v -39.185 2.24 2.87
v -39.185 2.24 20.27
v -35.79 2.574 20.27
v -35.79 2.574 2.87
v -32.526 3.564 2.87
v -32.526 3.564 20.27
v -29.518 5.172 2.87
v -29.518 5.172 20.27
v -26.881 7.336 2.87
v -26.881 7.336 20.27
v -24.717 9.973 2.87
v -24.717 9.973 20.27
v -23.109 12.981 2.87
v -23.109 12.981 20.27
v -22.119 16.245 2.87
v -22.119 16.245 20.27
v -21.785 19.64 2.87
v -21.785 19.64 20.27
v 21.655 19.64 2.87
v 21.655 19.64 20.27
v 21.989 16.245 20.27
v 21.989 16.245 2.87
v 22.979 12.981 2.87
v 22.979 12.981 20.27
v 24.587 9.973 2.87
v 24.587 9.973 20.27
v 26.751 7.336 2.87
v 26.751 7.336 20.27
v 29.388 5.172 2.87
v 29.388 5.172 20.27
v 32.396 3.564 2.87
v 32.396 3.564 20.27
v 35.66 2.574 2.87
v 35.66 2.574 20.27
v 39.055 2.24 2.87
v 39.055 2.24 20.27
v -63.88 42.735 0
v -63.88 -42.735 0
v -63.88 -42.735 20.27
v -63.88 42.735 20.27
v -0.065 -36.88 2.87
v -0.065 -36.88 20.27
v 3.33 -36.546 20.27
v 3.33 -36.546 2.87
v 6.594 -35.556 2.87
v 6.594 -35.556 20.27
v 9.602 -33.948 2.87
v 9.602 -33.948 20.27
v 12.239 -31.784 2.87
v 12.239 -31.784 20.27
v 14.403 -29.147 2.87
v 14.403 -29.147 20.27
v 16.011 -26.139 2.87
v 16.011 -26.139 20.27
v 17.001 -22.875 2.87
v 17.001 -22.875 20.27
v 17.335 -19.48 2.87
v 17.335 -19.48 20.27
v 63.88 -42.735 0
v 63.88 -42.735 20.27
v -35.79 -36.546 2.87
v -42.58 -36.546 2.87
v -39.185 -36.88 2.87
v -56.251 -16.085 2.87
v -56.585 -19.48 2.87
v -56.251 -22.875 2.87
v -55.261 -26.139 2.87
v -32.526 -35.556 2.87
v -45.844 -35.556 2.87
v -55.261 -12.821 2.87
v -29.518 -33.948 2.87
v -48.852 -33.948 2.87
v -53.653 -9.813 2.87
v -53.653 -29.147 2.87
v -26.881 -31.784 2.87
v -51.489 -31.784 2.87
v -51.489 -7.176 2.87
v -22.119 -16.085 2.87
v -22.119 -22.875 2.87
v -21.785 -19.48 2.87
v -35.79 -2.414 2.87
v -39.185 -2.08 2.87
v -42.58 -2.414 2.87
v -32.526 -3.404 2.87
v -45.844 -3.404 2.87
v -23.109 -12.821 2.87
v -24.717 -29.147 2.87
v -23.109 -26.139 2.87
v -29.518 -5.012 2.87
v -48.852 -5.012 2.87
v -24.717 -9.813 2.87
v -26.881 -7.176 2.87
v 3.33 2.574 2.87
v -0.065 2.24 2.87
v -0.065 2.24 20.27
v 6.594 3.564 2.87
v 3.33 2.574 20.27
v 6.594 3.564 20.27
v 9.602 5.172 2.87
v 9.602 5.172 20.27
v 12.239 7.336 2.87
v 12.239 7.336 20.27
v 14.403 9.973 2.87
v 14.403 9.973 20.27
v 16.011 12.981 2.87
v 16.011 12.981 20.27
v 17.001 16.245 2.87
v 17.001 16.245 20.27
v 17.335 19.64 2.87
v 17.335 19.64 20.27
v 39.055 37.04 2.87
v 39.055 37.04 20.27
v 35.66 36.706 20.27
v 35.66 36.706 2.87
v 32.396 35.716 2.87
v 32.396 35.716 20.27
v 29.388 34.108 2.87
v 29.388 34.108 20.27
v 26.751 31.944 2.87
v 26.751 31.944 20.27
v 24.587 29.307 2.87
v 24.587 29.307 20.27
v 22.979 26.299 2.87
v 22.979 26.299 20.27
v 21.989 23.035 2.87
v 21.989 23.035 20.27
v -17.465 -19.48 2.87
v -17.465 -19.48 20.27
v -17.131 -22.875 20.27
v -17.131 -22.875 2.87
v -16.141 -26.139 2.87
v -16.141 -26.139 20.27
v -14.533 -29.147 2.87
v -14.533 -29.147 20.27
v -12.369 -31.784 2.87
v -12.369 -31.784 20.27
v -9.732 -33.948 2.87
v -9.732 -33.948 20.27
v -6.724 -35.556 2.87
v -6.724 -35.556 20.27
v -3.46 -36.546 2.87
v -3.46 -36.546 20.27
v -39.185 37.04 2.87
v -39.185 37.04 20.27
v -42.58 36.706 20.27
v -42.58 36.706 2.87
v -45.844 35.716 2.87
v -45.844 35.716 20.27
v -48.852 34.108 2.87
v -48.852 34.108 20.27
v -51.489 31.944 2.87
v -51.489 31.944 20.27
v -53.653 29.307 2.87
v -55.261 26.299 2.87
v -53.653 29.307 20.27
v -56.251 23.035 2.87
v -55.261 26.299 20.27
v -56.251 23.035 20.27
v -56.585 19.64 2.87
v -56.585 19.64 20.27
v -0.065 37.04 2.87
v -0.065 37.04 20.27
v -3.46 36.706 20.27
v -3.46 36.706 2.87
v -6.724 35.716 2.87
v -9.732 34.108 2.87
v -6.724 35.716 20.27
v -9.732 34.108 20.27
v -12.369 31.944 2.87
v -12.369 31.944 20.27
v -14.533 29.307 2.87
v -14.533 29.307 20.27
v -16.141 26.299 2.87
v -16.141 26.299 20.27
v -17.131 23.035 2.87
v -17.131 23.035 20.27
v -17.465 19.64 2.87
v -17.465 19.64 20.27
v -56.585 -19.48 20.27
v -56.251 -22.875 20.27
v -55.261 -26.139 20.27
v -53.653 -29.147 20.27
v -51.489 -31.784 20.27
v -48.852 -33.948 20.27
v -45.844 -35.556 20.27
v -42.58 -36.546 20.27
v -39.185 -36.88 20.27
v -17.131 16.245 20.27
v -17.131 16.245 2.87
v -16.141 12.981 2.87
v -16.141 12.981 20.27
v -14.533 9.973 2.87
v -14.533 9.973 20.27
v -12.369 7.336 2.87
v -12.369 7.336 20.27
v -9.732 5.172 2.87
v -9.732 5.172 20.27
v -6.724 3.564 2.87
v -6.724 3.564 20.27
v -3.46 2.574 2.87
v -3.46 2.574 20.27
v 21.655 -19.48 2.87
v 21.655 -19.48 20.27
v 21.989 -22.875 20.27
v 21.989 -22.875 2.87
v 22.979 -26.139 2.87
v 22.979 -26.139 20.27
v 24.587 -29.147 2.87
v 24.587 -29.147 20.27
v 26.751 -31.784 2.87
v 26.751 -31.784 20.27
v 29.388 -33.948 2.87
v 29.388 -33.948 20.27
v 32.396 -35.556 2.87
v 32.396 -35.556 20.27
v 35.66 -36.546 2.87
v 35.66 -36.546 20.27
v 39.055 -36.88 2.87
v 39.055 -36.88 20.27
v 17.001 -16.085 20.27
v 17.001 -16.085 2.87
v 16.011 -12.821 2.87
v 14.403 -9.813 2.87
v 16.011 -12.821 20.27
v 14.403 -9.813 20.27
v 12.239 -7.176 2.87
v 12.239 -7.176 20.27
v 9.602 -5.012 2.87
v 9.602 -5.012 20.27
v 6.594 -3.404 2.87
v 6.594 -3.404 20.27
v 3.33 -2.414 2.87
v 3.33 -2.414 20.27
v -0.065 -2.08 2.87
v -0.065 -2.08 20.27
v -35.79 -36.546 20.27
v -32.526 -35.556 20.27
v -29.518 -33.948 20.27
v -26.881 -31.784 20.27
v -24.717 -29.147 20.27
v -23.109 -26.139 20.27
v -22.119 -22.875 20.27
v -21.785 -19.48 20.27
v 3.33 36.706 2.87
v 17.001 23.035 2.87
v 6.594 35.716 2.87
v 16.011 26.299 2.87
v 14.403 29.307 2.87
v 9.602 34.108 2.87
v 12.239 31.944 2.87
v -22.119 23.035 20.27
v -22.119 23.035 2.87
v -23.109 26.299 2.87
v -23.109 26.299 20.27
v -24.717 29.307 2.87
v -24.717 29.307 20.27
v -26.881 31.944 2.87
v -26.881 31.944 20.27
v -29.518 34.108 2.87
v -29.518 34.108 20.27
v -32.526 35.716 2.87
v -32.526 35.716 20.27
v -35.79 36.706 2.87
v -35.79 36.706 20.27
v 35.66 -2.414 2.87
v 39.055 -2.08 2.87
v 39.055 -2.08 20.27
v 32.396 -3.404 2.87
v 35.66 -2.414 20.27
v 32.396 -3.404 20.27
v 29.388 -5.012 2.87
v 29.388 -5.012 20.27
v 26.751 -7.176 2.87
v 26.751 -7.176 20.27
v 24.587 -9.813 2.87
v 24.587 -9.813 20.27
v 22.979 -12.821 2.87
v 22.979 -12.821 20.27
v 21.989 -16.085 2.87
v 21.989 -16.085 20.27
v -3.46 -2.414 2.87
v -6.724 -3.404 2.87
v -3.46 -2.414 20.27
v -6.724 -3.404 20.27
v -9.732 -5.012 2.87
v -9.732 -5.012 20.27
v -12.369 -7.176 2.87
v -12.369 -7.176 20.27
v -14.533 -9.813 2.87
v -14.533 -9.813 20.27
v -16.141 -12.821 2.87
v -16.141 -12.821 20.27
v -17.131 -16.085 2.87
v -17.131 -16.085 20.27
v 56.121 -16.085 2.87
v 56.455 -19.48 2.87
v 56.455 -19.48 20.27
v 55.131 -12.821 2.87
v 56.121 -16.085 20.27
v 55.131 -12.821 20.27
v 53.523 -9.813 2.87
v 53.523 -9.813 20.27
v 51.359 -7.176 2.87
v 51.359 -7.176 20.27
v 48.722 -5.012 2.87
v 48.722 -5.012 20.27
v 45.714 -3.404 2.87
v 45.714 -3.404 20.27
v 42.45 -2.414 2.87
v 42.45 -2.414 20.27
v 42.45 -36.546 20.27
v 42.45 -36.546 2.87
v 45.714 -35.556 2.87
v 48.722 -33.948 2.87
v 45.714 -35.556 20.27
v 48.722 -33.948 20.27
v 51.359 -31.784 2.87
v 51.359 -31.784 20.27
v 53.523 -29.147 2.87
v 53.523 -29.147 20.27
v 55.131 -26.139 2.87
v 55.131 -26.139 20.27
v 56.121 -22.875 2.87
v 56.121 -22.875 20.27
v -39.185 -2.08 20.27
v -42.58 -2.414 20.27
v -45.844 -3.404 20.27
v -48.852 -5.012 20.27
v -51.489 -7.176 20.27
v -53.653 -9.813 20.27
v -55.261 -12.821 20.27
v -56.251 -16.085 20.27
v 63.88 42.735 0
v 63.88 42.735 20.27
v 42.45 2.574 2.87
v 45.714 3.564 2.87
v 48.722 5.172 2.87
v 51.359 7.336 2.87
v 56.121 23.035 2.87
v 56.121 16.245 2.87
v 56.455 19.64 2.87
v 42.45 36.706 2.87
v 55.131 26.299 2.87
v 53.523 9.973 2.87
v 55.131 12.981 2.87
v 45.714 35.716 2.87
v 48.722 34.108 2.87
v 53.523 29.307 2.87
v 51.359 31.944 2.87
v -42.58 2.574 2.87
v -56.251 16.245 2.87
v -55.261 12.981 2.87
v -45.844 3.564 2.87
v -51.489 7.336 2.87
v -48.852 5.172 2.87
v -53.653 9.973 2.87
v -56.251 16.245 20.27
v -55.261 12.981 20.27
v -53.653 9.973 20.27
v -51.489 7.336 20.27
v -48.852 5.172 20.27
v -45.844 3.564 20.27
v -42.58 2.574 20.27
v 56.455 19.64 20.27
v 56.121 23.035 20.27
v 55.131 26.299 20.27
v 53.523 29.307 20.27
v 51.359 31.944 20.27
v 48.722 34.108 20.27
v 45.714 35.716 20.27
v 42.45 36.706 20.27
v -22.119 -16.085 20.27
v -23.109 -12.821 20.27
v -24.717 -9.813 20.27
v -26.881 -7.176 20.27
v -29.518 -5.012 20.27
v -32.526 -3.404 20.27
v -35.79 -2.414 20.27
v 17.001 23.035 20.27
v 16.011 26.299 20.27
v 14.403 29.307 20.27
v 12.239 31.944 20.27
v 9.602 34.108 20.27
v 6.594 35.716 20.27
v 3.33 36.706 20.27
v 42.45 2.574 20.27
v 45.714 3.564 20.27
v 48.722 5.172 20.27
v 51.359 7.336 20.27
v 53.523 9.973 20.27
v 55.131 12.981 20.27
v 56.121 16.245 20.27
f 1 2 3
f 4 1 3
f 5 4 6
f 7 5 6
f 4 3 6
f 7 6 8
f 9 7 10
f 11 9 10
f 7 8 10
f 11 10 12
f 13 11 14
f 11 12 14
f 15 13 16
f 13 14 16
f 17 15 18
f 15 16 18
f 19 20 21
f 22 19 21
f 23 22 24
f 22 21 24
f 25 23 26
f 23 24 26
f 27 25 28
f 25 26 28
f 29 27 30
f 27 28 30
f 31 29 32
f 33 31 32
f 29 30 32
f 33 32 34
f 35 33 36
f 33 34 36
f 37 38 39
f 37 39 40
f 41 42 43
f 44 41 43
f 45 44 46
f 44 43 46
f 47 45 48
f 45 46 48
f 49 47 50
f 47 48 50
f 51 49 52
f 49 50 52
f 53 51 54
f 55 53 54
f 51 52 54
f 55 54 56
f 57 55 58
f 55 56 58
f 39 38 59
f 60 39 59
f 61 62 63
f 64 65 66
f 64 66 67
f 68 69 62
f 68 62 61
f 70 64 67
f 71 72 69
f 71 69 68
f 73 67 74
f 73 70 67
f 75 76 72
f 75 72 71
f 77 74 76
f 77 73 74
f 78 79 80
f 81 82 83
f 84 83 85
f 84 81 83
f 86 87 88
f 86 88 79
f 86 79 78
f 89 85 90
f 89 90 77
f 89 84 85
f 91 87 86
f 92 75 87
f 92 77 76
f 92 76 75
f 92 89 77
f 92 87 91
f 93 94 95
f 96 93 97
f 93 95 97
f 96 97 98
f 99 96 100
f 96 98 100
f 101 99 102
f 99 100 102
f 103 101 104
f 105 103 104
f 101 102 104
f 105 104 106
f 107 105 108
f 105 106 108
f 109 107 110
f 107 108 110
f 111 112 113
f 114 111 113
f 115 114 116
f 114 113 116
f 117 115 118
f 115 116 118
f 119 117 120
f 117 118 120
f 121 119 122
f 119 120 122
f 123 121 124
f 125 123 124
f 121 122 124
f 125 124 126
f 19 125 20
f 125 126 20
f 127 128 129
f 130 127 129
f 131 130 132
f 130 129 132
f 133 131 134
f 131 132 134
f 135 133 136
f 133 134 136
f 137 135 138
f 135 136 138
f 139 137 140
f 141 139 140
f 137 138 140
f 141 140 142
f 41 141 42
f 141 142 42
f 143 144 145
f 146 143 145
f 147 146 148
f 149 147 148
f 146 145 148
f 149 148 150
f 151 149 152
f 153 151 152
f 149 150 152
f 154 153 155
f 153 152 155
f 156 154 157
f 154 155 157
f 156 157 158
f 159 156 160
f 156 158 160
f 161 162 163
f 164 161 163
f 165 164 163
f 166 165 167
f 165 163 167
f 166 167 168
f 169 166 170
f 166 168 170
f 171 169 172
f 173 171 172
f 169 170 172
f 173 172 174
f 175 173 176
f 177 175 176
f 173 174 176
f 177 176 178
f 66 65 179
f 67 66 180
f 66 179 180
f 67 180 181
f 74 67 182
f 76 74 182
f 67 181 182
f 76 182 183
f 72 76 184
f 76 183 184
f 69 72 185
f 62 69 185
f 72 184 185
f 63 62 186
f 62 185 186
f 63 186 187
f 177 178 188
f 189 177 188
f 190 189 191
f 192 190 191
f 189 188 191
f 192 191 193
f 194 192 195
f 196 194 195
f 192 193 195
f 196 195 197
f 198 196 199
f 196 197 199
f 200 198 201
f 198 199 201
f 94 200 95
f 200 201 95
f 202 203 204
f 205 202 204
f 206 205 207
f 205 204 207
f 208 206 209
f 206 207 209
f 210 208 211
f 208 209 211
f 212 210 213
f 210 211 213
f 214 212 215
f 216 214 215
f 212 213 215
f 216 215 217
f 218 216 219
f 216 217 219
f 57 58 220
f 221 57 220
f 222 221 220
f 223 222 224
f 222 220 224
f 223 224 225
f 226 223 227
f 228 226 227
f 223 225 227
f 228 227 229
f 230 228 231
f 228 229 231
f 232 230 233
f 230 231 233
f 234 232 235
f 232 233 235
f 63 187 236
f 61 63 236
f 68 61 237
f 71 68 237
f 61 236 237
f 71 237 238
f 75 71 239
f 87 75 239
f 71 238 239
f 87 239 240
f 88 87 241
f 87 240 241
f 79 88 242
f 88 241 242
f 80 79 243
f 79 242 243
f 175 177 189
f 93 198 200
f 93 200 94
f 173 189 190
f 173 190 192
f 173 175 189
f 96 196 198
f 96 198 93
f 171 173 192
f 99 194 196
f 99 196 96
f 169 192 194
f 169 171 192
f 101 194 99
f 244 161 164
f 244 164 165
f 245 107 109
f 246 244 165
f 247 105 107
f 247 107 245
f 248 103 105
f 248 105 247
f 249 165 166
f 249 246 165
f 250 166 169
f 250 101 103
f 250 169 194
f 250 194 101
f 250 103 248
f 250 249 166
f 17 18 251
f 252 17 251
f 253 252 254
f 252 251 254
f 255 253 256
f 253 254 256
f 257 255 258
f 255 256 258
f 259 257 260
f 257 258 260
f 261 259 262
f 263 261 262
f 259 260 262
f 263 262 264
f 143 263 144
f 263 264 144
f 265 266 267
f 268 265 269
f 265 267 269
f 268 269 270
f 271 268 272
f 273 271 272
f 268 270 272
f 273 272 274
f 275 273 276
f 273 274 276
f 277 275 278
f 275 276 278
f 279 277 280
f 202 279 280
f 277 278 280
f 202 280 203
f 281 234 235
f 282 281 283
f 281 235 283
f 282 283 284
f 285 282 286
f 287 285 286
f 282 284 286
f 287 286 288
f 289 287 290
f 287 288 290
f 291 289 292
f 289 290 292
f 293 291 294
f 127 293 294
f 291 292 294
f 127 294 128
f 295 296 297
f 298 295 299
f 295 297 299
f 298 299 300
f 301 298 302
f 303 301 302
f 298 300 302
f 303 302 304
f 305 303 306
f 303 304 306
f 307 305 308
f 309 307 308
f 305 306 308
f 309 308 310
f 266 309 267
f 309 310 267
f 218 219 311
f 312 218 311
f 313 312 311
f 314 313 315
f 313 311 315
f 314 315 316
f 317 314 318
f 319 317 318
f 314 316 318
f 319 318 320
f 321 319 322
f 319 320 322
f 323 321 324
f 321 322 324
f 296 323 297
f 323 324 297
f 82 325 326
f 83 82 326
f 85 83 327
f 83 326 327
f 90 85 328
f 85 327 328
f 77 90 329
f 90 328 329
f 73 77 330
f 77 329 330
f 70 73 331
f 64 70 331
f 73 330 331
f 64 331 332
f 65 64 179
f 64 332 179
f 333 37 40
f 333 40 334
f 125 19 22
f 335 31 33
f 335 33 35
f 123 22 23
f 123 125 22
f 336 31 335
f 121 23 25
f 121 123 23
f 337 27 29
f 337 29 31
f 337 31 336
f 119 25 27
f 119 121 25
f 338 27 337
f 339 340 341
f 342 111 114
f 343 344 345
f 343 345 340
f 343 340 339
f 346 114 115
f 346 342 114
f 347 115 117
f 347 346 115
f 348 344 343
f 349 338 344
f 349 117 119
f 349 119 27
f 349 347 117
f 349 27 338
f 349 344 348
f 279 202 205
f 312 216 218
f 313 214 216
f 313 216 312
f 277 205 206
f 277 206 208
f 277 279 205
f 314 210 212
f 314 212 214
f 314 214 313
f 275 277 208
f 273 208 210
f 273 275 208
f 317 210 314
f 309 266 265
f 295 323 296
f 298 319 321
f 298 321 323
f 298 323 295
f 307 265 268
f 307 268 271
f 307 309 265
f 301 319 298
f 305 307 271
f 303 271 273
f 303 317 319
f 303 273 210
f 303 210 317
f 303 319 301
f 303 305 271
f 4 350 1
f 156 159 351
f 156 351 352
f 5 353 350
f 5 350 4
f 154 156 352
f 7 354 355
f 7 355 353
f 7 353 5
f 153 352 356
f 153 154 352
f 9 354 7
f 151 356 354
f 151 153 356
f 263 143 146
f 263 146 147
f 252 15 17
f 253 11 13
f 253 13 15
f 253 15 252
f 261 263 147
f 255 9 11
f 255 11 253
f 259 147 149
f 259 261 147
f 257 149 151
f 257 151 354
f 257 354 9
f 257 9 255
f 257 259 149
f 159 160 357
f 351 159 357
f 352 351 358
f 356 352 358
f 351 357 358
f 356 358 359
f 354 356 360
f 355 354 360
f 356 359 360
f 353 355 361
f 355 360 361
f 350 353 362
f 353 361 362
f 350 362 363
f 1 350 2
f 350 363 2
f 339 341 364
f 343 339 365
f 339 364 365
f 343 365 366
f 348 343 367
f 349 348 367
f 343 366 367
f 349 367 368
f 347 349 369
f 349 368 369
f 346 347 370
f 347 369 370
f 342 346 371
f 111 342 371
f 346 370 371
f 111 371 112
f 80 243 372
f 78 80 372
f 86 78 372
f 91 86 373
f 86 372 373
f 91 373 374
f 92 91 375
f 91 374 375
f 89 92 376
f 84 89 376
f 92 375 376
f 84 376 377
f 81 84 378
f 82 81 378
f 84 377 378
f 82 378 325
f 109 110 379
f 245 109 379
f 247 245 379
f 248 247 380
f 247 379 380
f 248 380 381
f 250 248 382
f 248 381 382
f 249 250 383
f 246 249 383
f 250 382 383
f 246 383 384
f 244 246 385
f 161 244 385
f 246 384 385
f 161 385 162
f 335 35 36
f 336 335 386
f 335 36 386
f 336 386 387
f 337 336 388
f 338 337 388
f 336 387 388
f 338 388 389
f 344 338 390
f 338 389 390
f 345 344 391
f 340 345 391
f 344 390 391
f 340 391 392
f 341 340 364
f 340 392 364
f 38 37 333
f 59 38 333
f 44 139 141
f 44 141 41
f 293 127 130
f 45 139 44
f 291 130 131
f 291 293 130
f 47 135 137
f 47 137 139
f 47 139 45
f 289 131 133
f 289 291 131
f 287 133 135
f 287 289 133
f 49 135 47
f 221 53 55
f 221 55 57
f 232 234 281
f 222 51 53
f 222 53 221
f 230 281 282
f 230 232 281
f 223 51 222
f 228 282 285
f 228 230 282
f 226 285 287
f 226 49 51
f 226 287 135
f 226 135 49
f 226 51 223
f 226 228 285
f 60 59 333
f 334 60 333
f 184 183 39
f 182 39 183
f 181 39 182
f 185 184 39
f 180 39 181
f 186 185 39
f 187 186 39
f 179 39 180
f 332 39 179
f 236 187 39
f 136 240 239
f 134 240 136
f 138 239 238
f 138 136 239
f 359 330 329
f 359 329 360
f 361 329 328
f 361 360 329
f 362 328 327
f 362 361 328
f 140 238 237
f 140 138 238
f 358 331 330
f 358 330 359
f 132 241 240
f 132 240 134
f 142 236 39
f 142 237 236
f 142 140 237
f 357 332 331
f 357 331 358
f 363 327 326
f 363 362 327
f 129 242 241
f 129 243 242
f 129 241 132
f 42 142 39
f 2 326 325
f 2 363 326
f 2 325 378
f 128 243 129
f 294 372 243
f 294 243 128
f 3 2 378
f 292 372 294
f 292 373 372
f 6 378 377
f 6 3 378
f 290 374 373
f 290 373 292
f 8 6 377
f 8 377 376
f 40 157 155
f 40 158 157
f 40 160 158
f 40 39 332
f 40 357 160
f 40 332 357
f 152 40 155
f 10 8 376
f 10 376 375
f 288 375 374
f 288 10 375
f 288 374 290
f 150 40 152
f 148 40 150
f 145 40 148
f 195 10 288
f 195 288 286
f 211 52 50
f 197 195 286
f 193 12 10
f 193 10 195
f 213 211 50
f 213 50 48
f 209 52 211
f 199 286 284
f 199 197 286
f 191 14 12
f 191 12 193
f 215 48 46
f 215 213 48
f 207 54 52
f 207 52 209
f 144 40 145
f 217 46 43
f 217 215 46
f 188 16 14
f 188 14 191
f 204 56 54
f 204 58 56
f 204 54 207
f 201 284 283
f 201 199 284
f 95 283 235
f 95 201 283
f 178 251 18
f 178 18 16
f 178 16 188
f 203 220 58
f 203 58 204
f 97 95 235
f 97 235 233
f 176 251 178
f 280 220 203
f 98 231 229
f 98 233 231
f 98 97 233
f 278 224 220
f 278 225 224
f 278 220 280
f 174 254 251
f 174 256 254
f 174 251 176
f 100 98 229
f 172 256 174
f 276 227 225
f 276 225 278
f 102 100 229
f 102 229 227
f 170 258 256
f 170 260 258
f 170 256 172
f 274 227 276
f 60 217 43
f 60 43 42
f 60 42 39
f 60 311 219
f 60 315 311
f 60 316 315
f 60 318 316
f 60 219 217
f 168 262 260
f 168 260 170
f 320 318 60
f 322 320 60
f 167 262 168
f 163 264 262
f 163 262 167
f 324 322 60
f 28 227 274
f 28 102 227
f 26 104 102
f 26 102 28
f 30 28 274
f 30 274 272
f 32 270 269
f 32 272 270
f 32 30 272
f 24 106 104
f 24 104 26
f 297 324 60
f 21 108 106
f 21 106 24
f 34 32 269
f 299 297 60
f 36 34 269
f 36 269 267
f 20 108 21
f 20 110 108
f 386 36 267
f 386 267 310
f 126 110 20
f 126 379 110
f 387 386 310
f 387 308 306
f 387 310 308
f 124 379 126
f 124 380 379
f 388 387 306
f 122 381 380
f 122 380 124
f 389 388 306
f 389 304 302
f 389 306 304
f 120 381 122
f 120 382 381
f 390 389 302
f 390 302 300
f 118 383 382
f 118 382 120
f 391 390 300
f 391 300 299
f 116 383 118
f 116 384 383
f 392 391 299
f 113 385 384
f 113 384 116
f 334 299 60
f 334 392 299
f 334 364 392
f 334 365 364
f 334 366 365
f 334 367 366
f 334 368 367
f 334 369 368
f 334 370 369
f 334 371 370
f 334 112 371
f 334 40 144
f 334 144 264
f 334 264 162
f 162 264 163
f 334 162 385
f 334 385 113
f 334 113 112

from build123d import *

# Parameters (mm, degrees)
F0_W     = 127.76
F0_H     = 85.47
F1_DEPTH = 20.27
F3_DEPTH = 17.4


with BuildPart() as f1:
    # F0 (on Top) → F1 (new body)
    with BuildSketch(Plane.XY):
        Rectangle(F0_W, F0_H)
    extrude(amount=F1_DEPTH)

    # F2 (on face) → F3 (cut)
    with BuildSketch(Plane.XY.offset(20.27)):
        with BuildLine():
            Line((-39.185, 19.64), (-39.185, 37.04))
            ThreePointArc((-39.185, 37.04), (-51.4886579926, 31.9436579926), (-56.585, 19.64))
            Line((-56.585, 19.64), (-39.185, 19.64))
        make_face()
        with BuildLine():
            ThreePointArc((-21.785, 19.64), (-26.8813420074, 31.9436579926), (-39.185, 37.04))
            Line((-39.185, 37.04), (-39.185, 19.64))
            Line((-39.185, 19.64), (-21.785, 19.64))
        make_face()
        with BuildLine():
            Line((-21.785, 19.64), (-39.185, 19.64))
            Line((-39.185, 19.64), (-39.185, 2.24))
            ThreePointArc((-39.185, 2.24), (-26.8813420074, 7.3363420074), (-21.785, 19.64))
        make_face()
        with BuildLine():
            Line((-39.185, 2.24), (-39.185, 19.64))
            Line((-39.185, 19.64), (-56.585, 19.64))
            ThreePointArc((-56.585, 19.64), (-51.4886579926, 7.3363420074), (-39.185, 2.24))
        make_face()
        with BuildLine():
            ThreePointArc((-39.185, -2.08), (-51.4886579926, -7.1763420074), (-56.585, -19.48))
            Line((-56.585, -19.48), (-39.185, -19.48))
            Line((-39.185, -19.48), (-39.185, -2.08))
        make_face()
        with BuildLine():
            ThreePointArc((-21.785, -19.48), (-26.8813420074, -7.1763420074), (-39.185, -2.08))
            Line((-39.185, -2.08), (-39.185, -19.48))
            Line((-39.185, -19.48), (-21.785, -19.48))
        make_face()
        with BuildLine():
            Line((-39.185, -19.48), (-56.585, -19.48))
            ThreePointArc((-56.585, -19.48), (-51.4886579926, -31.7836579926), (-39.185, -36.88))
            Line((-39.185, -36.88), (-39.185, -19.48))
        make_face()
        with BuildLine():
            Line((-39.185, -19.48), (-39.185, -36.88))
            ThreePointArc((-39.185, -36.88), (-26.8813420074, -31.7836579926), (-21.785, -19.48))
            Line((-21.785, -19.48), (-39.185, -19.48))
        make_face()
        with BuildLine():
            Line((-0.065, 2.24), (-0.065, 19.64))
            Line((-0.065, 19.64), (-17.465, 19.64))
            ThreePointArc((-17.465, 19.64), (-12.3686579926, 7.3363420074), (-0.065, 2.24))
        make_face()
        with BuildLine():
            Line((-0.065, 19.64), (-0.065, 37.04))
            ThreePointArc((-0.065, 37.04), (-12.3686579926, 31.9436579926), (-17.465, 19.64))
            Line((-17.465, 19.64), (-0.065, 19.64))
        make_face()
        with BuildLine():
            ThreePointArc((17.335, 19.64), (12.2386579926, 31.9436579926), (-0.065, 37.04))
            Line((-0.065, 37.04), (-0.065, 19.64))
            Line((-0.065, 19.64), (17.335, 19.64))
        make_face()
        with BuildLine():
            Line((17.335, 19.64), (-0.065, 19.64))
            Line((-0.065, 19.64), (-0.065, 2.24))
            ThreePointArc((-0.065, 2.24), (12.2386579926, 7.3363420074), (17.335, 19.64))
        make_face()
        with BuildLine():
            ThreePointArc((17.335, -19.48), (12.2386579926, -7.1763420074), (-0.065, -2.08))
            Line((-0.065, -2.08), (-0.065, -19.48))
            Line((-0.065, -19.48), (17.335, -19.48))
        make_face()
        with BuildLine():
            Line((-0.065, -19.48), (-0.065, -2.08))
            ThreePointArc((-0.065, -2.08), (-12.3686579926, -7.1763420074), (-17.465, -19.48))
            Line((-17.465, -19.48), (-0.065, -19.48))
        make_face()
        with BuildLine():
            ThreePointArc((-17.465, -19.48), (-12.3686579926, -31.7836579926), (-0.065, -36.88))
            Line((-0.065, -36.88), (-0.065, -19.48))
            Line((-0.065, -19.48), (-17.465, -19.48))
        make_face()
        with BuildLine():
            Line((-0.065, -19.48), (-0.065, -36.88))
            ThreePointArc((-0.065, -36.88), (12.2386579926, -31.7836579926), (17.335, -19.48))
            Line((17.335, -19.48), (-0.065, -19.48))
        make_face()
        with BuildLine():
            Line((39.055, -36.88), (39.055, -19.48))
            Line((39.055, -19.48), (21.655, -19.48))
            ThreePointArc((21.655, -19.48), (26.7513420074, -31.7836579926), (39.055, -36.88))
        make_face()
        with BuildLine():
            Line((21.655, -19.48), (39.055, -19.48))
            Line((39.055, -19.48), (39.055, -2.08))
            ThreePointArc((39.055, -2.08), (26.7513420074, -7.1763420074), (21.655, -19.48))
        make_face()
        with BuildLine():
            Line((39.055, -19.48), (56.455, -19.48))
            ThreePointArc((56.455, -19.48), (51.3586579926, -7.1763420074), (39.055, -2.08))
            Line((39.055, -2.08), (39.055, -19.48))
        make_face()
        with BuildLine():
            ThreePointArc((39.055, -36.88), (51.3586579926, -31.7836579926), (56.455, -19.48))
            Line((56.455, -19.48), (39.055, -19.48))
            Line((39.055, -19.48), (39.055, -36.88))
        make_face()
        with BuildLine():
            ThreePointArc((39.055, 2.24), (51.3586579926, 7.3363420074), (56.455, 19.64))
            Line((56.455, 19.64), (39.055, 19.64))
            Line((39.055, 19.64), (39.055, 2.24))
        make_face()
        with BuildLine():
            Line((39.055, 19.64), (39.055, 37.04))
            ThreePointArc((39.055, 37.04), (26.7513420074, 31.9436579926), (21.655, 19.64))
            Line((21.655, 19.64), (39.055, 19.64))
        make_face()
        with BuildLine():
            ThreePointArc((56.455, 19.64), (51.3586579926, 31.9436579926), (39.055, 37.04))
            Line((39.055, 37.04), (39.055, 19.64))
            Line((39.055, 19.64), (56.455, 19.64))
        make_face()
        with BuildLine():
            Line((39.055, 2.24), (39.055, 19.64))
            Line((39.055, 19.64), (21.655, 19.64))
            ThreePointArc((21.655, 19.64), (26.7513420074, 7.3363420074), (39.055, 2.24))
        make_face()
    extrude(amount=-F3_DEPTH, mode=Mode.SUBTRACT)


solid = f1.part
